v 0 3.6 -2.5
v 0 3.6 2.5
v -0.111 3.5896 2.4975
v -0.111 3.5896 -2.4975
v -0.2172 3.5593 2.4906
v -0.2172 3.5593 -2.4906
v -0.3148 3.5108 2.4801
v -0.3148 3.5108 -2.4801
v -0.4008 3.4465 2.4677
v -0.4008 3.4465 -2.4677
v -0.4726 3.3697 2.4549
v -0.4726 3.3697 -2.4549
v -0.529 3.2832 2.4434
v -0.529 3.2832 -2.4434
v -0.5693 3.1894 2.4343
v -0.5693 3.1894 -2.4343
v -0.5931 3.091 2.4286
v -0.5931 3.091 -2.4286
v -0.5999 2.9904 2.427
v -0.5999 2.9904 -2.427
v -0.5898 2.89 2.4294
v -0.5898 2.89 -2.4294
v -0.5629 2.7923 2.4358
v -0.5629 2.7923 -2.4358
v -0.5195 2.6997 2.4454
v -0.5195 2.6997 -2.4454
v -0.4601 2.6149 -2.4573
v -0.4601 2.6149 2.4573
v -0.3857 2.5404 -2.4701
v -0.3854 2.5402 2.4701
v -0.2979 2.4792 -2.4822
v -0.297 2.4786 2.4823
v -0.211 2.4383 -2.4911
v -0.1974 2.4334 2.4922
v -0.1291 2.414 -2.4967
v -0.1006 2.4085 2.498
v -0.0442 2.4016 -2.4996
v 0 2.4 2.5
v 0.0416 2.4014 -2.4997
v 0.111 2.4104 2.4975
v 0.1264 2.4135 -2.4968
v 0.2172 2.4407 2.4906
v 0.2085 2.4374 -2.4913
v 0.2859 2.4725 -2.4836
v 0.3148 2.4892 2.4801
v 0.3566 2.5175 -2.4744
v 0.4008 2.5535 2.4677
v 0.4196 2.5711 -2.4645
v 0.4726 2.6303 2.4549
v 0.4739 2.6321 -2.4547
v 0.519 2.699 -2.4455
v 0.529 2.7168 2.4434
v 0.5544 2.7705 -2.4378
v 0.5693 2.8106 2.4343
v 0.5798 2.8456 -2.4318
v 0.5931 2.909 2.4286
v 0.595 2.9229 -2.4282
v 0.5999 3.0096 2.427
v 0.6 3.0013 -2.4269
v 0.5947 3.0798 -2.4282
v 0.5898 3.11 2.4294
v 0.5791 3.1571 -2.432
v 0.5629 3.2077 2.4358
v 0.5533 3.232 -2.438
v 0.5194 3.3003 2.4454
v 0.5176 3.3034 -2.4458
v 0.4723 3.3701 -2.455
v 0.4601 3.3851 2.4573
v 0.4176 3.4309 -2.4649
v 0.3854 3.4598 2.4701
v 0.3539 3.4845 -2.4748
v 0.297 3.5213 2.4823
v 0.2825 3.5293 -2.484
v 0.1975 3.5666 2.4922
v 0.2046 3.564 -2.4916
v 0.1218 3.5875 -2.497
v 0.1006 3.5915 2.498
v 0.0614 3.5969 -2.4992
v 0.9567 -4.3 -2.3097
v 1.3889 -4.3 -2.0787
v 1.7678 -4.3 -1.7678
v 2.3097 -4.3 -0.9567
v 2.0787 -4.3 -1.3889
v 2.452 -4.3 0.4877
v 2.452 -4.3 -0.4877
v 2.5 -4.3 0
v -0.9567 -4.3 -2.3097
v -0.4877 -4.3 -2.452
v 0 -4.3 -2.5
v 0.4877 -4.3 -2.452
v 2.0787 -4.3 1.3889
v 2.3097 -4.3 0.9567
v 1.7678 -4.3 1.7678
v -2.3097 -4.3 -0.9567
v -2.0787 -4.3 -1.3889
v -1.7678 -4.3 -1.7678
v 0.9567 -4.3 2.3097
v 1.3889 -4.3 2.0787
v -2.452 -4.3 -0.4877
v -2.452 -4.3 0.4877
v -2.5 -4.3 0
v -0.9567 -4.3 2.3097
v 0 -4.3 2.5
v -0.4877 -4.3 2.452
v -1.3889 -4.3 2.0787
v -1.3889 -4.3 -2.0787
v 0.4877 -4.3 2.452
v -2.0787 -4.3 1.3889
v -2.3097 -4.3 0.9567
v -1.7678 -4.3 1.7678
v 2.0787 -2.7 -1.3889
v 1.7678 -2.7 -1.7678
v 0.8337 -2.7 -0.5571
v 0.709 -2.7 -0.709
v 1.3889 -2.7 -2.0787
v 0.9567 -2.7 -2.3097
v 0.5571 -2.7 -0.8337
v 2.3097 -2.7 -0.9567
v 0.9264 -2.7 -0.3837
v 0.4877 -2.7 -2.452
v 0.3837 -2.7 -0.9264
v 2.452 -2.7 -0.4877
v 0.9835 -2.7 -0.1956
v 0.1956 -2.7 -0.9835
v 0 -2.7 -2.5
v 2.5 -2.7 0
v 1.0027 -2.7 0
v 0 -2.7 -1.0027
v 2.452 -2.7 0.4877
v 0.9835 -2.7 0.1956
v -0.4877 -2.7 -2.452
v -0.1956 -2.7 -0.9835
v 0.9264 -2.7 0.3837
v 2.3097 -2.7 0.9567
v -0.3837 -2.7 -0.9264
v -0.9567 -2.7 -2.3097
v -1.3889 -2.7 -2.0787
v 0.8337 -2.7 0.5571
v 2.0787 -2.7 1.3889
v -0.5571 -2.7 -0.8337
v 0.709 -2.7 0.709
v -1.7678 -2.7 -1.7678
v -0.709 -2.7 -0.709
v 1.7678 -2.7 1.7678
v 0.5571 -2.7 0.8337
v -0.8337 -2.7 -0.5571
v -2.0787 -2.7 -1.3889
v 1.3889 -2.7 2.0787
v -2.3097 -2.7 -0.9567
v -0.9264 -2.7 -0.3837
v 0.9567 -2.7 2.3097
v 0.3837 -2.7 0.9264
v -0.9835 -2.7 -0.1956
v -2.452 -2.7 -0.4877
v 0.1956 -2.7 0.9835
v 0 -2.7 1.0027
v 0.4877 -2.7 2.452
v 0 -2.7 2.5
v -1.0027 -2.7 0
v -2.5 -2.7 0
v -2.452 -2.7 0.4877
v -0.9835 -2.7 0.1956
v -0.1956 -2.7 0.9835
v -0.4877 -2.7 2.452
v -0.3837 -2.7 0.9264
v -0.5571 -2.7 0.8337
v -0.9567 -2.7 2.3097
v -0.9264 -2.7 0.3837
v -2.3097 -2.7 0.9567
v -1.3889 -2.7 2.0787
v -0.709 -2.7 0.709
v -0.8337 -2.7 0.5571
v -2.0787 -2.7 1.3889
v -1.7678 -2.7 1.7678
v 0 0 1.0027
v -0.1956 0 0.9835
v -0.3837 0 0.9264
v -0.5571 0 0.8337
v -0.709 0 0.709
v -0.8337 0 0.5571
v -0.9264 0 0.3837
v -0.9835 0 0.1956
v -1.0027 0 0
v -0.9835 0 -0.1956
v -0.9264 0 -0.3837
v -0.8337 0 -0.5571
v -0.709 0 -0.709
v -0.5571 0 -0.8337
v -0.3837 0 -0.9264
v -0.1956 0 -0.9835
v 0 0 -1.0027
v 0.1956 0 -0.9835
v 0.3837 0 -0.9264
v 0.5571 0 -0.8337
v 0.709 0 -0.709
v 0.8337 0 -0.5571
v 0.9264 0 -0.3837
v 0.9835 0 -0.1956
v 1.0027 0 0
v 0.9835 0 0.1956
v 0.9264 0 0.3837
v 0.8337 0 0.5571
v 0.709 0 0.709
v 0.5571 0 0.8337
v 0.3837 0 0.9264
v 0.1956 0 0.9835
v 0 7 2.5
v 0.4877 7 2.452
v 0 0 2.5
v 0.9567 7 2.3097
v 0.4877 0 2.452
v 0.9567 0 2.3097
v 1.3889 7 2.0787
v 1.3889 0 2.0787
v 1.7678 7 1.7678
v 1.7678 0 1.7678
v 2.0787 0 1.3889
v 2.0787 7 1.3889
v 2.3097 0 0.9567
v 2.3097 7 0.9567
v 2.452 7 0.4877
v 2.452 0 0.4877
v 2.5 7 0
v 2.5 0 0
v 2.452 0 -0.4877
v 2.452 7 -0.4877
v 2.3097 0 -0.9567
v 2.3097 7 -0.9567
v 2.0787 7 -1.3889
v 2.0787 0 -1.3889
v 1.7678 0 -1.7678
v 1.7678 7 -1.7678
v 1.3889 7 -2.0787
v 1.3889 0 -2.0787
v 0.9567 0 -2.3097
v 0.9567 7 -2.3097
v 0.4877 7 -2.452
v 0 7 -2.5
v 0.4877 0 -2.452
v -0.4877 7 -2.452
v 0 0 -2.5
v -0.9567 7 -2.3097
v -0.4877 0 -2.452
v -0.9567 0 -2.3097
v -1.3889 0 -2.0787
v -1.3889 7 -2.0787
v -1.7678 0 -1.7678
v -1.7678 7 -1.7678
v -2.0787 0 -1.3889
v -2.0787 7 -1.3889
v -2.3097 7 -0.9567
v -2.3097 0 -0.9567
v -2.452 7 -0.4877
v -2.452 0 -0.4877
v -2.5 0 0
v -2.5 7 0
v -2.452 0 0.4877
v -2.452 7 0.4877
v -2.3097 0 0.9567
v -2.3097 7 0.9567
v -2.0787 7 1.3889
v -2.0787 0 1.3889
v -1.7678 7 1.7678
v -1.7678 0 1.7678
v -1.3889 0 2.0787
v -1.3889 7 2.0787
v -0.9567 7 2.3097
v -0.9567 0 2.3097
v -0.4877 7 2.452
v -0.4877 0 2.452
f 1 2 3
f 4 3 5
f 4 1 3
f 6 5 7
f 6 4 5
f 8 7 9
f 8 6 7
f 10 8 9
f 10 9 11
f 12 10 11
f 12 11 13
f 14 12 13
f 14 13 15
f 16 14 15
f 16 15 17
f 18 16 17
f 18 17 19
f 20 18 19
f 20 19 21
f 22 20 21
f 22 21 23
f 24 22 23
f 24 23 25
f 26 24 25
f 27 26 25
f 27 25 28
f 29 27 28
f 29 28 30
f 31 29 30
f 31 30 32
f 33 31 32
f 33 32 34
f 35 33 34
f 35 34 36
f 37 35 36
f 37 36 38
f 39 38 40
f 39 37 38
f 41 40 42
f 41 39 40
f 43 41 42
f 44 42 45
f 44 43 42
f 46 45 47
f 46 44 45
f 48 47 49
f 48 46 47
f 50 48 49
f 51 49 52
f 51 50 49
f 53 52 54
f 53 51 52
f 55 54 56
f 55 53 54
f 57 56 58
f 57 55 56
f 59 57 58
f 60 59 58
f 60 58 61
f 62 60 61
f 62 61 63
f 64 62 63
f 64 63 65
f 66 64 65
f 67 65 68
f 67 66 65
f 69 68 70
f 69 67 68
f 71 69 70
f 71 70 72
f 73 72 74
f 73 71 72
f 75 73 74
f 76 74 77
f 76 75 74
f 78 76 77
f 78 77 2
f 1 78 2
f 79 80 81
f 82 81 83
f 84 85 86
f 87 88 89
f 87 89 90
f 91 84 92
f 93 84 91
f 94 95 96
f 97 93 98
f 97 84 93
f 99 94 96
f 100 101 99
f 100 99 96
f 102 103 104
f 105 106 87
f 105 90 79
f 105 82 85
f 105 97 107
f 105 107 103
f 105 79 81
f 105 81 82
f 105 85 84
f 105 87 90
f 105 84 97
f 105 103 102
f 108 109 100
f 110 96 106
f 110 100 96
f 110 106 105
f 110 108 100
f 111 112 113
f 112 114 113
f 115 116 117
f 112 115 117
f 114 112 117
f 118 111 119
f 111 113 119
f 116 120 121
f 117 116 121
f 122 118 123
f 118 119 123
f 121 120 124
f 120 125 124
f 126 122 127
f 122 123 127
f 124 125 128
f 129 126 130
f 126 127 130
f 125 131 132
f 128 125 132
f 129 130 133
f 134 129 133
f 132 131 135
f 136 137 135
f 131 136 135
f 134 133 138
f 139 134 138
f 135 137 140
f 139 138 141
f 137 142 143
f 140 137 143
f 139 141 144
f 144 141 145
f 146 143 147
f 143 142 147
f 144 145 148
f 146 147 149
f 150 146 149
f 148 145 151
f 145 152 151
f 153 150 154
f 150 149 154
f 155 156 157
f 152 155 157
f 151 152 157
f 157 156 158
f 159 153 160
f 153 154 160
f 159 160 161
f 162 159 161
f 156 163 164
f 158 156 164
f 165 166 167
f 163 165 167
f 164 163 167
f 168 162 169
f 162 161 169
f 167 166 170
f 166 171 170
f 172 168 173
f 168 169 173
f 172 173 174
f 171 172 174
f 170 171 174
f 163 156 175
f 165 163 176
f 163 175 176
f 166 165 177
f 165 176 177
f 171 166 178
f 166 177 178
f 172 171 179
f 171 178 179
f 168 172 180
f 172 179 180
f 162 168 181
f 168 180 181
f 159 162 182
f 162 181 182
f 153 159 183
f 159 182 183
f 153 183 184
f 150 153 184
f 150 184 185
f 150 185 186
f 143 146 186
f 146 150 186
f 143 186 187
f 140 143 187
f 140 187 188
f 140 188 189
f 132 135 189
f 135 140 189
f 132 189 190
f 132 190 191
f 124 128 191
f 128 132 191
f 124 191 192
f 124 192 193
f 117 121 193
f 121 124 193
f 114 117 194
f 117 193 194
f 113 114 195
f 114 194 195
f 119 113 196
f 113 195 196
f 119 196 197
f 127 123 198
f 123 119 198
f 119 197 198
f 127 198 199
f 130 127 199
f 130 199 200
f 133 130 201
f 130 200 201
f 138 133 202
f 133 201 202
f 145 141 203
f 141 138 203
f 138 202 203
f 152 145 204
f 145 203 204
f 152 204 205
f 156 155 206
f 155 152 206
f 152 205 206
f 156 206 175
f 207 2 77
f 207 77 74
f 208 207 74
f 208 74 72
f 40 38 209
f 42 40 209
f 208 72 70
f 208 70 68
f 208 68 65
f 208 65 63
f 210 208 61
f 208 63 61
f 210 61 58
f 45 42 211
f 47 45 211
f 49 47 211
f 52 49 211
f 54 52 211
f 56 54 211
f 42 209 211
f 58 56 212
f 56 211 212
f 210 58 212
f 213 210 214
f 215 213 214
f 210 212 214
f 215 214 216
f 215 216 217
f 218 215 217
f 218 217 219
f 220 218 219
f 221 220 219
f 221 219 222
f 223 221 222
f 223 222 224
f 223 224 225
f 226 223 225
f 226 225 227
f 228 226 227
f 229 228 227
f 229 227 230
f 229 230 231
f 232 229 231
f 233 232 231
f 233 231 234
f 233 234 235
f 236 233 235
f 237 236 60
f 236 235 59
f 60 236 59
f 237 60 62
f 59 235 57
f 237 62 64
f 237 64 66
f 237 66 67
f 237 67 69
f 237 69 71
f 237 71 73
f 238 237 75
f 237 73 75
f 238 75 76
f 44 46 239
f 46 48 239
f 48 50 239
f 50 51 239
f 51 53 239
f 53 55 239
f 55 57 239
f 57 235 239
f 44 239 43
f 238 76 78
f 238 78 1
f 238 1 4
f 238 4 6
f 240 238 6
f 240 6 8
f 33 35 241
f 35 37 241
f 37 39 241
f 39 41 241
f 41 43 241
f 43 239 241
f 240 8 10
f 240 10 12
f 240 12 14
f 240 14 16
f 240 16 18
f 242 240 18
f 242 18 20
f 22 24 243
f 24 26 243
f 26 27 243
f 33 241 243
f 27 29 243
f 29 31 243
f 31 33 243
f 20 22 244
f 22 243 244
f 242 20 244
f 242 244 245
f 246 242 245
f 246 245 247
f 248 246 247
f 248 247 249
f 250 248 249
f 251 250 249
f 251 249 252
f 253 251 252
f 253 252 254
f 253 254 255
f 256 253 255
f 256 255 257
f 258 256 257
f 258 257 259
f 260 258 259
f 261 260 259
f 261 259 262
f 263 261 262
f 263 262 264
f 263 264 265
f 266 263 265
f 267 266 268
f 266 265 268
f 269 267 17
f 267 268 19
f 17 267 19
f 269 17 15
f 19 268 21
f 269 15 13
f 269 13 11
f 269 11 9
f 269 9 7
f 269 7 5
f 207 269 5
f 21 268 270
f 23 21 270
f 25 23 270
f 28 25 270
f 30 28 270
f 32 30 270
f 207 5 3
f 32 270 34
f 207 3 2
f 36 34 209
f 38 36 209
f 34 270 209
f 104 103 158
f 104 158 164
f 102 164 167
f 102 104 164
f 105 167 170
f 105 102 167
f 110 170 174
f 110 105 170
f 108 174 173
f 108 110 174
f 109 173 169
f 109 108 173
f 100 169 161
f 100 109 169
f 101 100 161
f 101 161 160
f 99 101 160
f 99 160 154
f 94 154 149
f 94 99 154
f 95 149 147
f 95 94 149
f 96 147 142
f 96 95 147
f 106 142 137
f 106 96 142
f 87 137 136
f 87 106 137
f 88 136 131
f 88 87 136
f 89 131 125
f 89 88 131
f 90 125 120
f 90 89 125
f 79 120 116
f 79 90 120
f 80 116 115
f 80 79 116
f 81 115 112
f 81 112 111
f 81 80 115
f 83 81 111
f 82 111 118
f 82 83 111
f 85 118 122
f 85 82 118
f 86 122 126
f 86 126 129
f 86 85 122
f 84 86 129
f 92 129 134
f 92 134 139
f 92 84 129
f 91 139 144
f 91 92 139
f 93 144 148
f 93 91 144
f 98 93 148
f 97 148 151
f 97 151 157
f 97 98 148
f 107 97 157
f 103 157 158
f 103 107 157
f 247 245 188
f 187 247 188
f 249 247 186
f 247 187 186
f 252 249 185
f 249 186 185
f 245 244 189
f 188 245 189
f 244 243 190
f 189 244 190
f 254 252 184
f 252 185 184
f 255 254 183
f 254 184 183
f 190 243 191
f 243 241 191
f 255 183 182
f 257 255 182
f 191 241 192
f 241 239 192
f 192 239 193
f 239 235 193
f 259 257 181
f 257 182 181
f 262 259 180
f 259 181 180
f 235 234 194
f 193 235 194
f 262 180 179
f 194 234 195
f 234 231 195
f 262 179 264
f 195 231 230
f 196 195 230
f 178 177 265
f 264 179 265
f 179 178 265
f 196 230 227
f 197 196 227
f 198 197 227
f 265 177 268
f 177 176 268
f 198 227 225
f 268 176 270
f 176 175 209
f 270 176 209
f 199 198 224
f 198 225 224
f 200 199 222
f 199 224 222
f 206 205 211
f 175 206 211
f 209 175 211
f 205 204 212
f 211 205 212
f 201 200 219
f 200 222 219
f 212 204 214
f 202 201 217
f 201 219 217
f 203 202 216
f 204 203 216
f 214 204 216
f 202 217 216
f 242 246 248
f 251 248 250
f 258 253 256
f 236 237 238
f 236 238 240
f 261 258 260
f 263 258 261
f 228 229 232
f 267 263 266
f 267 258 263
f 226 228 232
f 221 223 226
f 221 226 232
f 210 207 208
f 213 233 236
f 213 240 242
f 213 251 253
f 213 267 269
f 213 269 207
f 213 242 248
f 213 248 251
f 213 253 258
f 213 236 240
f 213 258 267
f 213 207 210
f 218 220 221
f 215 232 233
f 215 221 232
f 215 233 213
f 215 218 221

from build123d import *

# Parameters (mm, degrees)
SKETCH1_R               = 2.5
BOSS_EXTRUDE1_DEPTH     = 7
CUT_EXTRUDE1_DEPTH      = 8.842193571
CUT_EXTRUDE1_DEPTH_BACK = 8.842193571
SKETCH2_R               = 0.6
SKETCH3_R               = 1.002734692
BOSS_EXTRUDE2_DEPTH     = 4.3
SKETCH4_R               = 2.5
BOSS_EXTRUDE3_DEPTH     = 1.6


with BuildPart() as part:
    # Sketch1 → Boss-Extrude1 (new body)
    with BuildSketch(Plane(origin=(0, 0, 0), x_dir=(1, 0, 0), z_dir=(0, 1, 0))):
        with Locations(Location((0, 0, 0), (0, 0, 270))):
            Circle(SKETCH1_R)
    extrude(amount=BOSS_EXTRUDE1_DEPTH)

    # Sketch2 → Cut-Extrude1 (cut, two sides: drawn at the far end of the back side and taken through both)
    with BuildSketch(Plane.XY.offset(-CUT_EXTRUDE1_DEPTH_BACK)):
        with Locations(Location((0, 3, 0), (0, 0, 90.000000021))):
            Circle(SKETCH2_R)
    extrude(amount=CUT_EXTRUDE1_DEPTH + CUT_EXTRUDE1_DEPTH_BACK, mode=Mode.SUBTRACT)

    # Sketch3 → Boss-Extrude2 (add)
    with BuildSketch(Plane.XZ):
        with Locations(Location((0, 0, 0), (0, 0, 90))):
            Circle(SKETCH3_R)
    extrude(amount=BOSS_EXTRUDE2_DEPTH)

    # Sketch4 → Boss-Extrude3 (add)
    with BuildSketch(Plane.XZ.offset(4.3)):
        with Locations(Location((0, 0, 0), (0, 0, 90))):
            Circle(SKETCH4_R)
    extrude(amount=-BOSS_EXTRUDE3_DEPTH)


solid = part.part
